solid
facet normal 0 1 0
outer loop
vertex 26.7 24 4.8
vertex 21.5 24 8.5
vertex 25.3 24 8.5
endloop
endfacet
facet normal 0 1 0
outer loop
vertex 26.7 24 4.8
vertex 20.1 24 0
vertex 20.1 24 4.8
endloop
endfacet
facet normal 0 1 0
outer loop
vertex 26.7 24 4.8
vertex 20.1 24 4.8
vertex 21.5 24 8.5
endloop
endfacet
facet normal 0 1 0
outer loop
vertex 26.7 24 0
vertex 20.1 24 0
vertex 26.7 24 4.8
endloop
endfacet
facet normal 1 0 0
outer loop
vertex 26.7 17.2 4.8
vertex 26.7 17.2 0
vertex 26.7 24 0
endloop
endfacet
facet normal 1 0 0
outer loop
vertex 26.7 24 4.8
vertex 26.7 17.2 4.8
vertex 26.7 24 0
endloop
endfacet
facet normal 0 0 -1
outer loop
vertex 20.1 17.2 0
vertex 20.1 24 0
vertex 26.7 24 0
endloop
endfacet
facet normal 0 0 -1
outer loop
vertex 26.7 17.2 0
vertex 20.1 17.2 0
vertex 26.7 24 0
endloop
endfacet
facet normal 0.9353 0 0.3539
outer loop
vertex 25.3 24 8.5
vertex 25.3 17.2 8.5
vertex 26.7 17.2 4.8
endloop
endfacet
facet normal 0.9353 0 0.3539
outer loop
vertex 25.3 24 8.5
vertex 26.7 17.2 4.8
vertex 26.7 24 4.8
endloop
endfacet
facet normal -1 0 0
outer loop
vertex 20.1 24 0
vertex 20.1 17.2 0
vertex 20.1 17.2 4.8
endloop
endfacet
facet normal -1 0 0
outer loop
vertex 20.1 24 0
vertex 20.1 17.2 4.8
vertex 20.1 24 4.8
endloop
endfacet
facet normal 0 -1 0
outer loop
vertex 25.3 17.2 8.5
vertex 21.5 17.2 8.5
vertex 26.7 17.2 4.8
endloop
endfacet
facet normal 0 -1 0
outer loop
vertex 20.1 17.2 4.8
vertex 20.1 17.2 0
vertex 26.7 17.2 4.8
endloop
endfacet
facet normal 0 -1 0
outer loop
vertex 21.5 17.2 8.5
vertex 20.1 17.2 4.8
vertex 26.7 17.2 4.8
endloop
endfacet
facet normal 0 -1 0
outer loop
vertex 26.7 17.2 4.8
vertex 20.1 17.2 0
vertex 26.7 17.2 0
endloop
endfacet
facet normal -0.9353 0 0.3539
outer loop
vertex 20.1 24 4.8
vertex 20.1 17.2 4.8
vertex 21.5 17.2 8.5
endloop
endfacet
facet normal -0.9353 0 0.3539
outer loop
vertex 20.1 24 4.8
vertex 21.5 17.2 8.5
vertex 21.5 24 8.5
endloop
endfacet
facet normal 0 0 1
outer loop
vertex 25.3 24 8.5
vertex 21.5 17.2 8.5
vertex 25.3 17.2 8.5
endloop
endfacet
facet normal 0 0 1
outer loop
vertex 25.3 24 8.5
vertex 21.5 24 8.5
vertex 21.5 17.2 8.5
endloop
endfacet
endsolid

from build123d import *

# Parameters (mm, degrees)
SKETCH016_W      = 6.6
SKETCH016_H      = 6.8
PAD007_DEPTH     = 8.5
CHAMFER004_SIZE2 = 1.4
CHAMFER004_SIZE  = 3.7
CHAMFER005_SIZE2 = 3.7
CHAMFER005_SIZE  = 1.4


with BuildPart() as part:
    # Sketch016 → Pad007 (new body)
    with BuildSketch(Plane.XY):
        with Locations((50.1, 20.6)):
            Rectangle(SKETCH016_W, SKETCH016_H)
    extrude(amount=PAD007_DEPTH)

    # Chamfer004
    chamfer004_edges = [part.edges().sort_by_distance(p)[0] for p in [
        (53.4, 20.6, 8.5),
    ]]
    chamfer004_side = part.faces().sort_by_distance((53.4, 20.6, 4.25))[0]
    chamfer(chamfer004_edges, length=CHAMFER004_SIZE, length2=CHAMFER004_SIZE2, reference=chamfer004_side)

    # Chamfer005
    chamfer005_edges = [part.edges().sort_by_distance(p)[0] for p in [
        (46.8, 20.6, 8.5),
    ]]
    chamfer005_side = part.faces().sort_by_distance((49.4, 20.6, 8.5))[0]
    chamfer(chamfer005_edges, length=CHAMFER005_SIZE, length2=CHAMFER005_SIZE2, reference=chamfer005_side)


with BuildPart() as part_1:
    # Body020 placement: moved
    add(part.part.moved(Location((-26.7, 0, 0))))


solid = part_1.part
